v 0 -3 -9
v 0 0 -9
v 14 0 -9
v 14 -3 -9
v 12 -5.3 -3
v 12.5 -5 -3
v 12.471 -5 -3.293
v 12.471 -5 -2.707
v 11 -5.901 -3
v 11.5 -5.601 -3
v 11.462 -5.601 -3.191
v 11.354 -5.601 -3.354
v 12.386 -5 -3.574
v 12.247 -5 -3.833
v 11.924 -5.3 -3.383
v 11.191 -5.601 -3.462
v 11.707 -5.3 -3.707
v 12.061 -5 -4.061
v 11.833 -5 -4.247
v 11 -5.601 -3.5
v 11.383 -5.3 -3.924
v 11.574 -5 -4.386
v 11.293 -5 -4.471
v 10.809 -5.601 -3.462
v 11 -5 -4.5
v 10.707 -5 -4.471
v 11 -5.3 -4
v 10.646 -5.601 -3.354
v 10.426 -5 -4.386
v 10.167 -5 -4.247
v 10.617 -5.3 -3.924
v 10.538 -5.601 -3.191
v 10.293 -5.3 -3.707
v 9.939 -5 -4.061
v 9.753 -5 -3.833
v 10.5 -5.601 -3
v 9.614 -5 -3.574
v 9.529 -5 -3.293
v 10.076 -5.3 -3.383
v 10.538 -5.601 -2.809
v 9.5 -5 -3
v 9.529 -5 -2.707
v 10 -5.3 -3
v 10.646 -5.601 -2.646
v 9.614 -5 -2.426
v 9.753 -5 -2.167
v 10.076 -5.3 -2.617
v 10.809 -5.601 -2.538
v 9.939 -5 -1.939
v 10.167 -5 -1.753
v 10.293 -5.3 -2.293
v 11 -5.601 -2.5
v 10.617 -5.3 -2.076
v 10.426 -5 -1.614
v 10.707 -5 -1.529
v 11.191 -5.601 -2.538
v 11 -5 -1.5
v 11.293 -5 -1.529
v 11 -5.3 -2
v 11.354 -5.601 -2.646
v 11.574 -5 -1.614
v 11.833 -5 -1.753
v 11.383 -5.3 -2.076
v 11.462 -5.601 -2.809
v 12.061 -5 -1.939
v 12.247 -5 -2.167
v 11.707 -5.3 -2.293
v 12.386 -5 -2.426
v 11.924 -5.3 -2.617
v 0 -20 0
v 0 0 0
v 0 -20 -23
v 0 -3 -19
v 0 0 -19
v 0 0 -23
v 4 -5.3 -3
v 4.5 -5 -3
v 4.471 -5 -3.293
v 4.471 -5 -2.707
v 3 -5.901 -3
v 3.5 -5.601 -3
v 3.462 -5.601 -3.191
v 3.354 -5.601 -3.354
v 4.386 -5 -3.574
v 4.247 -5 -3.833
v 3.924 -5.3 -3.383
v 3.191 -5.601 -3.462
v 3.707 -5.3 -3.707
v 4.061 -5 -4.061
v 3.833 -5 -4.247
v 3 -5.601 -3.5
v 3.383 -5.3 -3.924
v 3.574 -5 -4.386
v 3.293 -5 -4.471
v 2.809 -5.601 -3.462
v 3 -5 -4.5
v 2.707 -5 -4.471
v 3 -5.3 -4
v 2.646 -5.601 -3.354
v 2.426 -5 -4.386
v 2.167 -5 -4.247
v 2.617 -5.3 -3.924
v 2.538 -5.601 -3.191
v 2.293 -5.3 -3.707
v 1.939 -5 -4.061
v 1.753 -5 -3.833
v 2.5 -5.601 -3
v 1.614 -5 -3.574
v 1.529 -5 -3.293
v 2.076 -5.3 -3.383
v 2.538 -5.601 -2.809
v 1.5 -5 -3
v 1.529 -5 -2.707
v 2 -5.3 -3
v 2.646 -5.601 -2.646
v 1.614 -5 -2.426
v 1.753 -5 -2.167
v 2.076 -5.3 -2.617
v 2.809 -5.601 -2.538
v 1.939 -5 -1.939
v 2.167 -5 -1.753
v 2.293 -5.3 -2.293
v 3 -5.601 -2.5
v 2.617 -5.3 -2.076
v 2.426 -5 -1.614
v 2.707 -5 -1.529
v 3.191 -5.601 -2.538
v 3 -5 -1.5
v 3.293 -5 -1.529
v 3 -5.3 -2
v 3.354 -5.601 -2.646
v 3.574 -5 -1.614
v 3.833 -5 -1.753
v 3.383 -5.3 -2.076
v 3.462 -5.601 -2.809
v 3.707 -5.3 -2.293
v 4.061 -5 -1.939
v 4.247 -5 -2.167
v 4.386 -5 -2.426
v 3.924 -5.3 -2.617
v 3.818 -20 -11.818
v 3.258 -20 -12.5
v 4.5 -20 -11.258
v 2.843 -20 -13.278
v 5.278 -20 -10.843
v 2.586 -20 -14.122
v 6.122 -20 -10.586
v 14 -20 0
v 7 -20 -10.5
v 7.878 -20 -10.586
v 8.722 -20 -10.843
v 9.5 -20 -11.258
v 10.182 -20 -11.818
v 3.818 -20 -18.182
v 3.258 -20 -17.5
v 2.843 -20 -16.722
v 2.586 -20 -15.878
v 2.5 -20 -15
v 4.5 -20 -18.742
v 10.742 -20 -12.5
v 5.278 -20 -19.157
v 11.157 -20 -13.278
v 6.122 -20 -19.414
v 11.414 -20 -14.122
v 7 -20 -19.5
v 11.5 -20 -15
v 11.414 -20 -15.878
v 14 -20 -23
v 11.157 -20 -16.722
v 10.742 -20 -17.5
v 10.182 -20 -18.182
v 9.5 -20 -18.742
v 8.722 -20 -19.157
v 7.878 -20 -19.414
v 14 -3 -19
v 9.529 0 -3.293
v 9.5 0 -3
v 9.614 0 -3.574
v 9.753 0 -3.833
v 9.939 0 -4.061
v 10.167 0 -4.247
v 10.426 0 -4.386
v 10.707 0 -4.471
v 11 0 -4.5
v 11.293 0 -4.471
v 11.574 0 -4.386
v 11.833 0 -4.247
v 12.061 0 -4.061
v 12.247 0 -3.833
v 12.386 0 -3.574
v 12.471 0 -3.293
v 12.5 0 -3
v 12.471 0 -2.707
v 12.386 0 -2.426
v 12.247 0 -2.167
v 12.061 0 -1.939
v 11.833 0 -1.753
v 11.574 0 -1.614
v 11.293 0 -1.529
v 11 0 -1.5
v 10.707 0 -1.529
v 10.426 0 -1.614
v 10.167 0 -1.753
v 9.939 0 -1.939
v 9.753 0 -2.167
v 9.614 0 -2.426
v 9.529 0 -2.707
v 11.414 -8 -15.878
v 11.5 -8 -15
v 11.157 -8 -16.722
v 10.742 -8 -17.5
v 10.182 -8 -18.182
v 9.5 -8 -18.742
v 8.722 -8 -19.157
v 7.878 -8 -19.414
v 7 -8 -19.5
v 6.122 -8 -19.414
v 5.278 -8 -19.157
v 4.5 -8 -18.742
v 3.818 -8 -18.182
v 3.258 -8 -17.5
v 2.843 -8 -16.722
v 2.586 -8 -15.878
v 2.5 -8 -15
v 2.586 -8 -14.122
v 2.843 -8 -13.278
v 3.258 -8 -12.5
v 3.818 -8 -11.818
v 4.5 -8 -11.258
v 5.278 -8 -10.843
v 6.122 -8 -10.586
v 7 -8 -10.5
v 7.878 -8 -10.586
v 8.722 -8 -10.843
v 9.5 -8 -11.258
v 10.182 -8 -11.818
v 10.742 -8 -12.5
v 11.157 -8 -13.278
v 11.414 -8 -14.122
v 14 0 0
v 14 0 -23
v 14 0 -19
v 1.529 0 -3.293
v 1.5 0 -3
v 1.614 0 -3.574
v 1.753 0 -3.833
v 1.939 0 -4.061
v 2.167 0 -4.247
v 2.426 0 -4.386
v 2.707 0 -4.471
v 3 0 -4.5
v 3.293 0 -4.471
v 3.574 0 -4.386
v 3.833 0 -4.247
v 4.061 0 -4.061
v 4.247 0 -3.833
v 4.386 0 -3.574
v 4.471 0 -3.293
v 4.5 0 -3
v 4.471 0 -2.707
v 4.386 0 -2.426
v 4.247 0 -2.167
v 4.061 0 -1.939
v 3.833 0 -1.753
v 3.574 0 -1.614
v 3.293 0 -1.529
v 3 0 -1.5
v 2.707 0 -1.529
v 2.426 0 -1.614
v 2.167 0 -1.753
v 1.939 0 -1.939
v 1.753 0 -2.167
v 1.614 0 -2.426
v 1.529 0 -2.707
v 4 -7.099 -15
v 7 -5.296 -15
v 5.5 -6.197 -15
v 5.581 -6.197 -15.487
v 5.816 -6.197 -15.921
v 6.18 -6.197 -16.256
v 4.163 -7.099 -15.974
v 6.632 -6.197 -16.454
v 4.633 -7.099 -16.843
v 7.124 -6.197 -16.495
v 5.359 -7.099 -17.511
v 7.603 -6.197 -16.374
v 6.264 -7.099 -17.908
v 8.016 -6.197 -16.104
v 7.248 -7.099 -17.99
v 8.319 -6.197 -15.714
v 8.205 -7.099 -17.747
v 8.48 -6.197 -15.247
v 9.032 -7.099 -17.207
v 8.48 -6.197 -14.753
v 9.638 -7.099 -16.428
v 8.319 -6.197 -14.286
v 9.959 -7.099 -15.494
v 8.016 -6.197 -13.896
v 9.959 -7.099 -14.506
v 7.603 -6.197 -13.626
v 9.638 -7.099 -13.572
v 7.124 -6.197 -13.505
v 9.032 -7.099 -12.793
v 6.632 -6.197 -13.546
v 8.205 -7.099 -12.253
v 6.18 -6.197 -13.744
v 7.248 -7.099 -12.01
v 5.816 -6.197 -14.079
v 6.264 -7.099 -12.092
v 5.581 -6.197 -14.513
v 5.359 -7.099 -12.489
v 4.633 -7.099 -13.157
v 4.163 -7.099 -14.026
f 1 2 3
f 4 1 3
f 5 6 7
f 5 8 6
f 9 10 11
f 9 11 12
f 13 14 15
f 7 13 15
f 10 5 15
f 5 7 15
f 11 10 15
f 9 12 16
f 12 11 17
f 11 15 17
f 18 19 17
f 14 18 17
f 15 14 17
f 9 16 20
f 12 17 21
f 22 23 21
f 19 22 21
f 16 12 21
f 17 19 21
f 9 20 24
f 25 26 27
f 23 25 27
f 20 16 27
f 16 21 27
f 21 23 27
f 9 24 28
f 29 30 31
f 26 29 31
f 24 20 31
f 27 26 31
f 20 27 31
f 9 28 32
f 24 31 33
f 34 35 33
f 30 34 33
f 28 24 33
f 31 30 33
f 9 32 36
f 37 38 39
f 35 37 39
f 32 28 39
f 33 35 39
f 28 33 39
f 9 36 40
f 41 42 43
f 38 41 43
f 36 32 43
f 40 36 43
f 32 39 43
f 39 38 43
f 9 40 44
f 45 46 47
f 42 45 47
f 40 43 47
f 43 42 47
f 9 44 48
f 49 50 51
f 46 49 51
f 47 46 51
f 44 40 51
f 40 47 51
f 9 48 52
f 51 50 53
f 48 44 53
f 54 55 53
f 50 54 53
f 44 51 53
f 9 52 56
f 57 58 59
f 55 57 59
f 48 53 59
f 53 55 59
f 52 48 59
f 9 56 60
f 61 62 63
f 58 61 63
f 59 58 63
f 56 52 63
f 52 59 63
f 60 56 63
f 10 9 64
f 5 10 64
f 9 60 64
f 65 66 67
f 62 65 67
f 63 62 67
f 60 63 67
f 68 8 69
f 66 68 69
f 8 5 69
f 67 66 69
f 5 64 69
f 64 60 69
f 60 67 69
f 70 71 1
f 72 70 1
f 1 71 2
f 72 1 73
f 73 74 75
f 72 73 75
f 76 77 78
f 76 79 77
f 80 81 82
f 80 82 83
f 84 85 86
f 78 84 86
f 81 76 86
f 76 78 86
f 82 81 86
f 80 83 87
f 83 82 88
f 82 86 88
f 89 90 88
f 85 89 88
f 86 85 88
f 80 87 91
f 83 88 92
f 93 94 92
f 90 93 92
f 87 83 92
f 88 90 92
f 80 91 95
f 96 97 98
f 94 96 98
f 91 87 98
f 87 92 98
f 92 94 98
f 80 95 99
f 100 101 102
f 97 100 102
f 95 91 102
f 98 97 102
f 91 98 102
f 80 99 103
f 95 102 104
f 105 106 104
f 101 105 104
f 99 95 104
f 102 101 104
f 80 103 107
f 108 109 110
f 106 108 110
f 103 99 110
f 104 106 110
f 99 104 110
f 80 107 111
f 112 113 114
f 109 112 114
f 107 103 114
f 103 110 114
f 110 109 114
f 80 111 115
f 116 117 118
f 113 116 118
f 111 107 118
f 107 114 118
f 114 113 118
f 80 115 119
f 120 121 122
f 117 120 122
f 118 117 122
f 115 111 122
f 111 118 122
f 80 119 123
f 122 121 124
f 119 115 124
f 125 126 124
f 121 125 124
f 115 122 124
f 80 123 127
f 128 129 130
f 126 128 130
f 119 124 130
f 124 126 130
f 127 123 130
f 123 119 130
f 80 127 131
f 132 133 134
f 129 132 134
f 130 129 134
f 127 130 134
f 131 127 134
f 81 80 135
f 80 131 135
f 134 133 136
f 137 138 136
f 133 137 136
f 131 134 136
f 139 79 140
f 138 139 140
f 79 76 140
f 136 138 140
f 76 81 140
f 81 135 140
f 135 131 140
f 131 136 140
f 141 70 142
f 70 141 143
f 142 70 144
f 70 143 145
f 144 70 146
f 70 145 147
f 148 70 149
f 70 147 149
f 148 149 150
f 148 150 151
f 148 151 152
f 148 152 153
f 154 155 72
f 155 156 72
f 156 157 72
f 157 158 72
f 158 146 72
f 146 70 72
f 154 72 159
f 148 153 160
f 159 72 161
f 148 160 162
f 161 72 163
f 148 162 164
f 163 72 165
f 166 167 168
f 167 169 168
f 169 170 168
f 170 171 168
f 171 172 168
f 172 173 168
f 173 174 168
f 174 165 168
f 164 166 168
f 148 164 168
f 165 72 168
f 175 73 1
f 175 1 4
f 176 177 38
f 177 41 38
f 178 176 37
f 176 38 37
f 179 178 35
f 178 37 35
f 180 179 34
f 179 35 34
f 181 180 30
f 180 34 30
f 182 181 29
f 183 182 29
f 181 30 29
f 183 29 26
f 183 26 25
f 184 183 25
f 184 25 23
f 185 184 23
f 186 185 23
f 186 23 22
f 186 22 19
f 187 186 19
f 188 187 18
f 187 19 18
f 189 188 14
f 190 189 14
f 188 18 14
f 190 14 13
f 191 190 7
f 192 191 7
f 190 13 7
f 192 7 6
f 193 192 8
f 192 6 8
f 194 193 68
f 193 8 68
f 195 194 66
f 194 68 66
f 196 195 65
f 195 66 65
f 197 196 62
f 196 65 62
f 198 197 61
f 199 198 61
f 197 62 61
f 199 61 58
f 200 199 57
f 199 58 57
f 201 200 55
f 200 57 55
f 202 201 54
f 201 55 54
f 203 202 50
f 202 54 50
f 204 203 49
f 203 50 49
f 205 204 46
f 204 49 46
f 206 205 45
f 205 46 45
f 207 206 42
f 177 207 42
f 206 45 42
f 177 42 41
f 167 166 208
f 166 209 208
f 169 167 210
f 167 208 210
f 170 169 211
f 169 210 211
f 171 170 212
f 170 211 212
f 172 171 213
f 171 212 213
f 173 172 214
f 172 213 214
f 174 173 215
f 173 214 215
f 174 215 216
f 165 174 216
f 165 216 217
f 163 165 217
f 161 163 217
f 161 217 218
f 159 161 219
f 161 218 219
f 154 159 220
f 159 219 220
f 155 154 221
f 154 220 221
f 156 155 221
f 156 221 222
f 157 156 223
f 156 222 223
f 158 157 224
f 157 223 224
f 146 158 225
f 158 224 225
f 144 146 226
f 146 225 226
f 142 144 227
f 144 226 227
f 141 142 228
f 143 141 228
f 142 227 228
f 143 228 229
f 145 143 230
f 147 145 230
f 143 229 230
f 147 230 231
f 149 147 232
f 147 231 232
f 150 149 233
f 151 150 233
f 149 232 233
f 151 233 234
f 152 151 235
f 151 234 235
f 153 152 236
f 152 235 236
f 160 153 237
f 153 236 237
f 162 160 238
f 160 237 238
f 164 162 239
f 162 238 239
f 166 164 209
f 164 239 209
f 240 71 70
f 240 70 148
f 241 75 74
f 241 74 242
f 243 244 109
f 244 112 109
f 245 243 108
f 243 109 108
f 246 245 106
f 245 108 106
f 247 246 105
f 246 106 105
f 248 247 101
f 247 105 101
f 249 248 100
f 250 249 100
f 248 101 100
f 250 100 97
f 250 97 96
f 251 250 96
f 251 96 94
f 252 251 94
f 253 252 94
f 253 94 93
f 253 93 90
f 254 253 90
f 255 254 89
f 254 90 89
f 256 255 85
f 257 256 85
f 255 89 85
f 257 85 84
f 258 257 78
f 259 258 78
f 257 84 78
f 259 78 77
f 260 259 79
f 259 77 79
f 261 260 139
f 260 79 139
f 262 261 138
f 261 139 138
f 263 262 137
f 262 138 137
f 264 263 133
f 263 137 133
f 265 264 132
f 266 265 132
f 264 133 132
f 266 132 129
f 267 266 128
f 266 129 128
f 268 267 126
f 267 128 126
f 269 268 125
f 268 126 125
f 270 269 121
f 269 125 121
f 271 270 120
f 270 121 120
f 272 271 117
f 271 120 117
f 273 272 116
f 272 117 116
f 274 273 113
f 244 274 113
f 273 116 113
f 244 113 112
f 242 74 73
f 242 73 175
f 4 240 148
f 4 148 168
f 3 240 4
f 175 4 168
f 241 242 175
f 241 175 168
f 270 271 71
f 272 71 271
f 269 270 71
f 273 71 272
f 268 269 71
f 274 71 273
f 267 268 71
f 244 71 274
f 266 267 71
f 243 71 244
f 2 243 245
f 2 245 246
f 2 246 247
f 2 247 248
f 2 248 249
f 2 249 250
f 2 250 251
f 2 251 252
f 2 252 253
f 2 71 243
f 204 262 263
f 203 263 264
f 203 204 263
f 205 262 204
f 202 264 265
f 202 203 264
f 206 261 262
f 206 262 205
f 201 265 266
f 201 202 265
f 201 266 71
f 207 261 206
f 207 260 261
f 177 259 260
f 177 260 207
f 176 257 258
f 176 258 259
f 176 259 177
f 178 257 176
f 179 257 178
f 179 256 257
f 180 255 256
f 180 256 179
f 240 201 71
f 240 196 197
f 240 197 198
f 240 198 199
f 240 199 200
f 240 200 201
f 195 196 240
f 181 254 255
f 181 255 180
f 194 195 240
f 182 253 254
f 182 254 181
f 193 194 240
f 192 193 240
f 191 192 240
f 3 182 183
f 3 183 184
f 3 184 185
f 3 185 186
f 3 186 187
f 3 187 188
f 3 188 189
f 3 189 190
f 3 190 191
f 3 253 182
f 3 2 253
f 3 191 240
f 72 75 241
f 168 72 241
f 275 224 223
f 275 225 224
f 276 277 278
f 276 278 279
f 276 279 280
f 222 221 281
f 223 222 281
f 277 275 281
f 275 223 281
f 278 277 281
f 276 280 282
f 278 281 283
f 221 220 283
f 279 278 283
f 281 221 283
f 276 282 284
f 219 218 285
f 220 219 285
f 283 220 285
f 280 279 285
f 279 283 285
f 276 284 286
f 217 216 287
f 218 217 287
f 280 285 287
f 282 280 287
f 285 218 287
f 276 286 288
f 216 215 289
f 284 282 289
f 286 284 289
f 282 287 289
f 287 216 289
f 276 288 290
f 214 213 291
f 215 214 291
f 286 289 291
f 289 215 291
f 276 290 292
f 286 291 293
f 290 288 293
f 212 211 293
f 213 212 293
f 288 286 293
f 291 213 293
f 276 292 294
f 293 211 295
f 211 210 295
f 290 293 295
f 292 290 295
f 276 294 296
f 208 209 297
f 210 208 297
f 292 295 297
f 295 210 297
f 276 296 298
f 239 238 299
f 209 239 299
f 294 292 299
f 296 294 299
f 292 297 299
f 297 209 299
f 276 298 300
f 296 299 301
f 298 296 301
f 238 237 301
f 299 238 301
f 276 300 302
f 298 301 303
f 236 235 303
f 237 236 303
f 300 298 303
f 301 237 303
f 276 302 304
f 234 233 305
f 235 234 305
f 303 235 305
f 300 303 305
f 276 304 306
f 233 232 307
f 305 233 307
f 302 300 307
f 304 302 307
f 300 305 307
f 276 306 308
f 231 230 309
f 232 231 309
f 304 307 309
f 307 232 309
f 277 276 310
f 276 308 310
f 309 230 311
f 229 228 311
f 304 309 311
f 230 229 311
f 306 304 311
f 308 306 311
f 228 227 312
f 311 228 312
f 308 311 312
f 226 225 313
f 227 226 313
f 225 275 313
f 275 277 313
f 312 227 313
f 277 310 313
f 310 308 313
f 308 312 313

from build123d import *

# Parameters (mm, degrees)
SKETCH1_W                    = 14
SKETCH1_H                    = 23
BOSS_EXTRUDE1_DEPTH          = 20
SKETCH2_W                    = 14
SKETCH2_H                    = 10
CUT_EXTRUDE1_DEPTH           = 3
F_3_0_3_DIAMETER_HOLE1_D     = 3
F_3_0_3_DIAMETER_HOLE1_DEPTH = 5
F_3_0_3_DIAMETER_HOLE1_TIP   = 0.901290929
M10X1_0_TAPPED_HOLE1_D       = 9
M10X1_0_TAPPED_HOLE1_DEPTH   = 12
M10X1_0_TAPPED_HOLE1_TIP     = 2.703872786


with BuildPart() as part:
    # Sketch1 → Boss-Extrude1 (new body)
    with BuildSketch(Plane(origin=(0, 0, 0), x_dir=(1, 0, 0), z_dir=(0, 1, 0))):
        with Locations((7, 11.5)):
            Rectangle(SKETCH1_W, SKETCH1_H)
    extrude(amount=-BOSS_EXTRUDE1_DEPTH)

    # Sketch2 → Cut-Extrude1 (cut)
    with BuildSketch(Plane(origin=(0, 0, 0), x_dir=(1, 0, 0), z_dir=(0, 1, 0))):
        with Locations((7, 14)):
            Rectangle(SKETCH2_W, SKETCH2_H)
    extrude(amount=-CUT_EXTRUDE1_DEPTH, mode=Mode.SUBTRACT)

    # Ø3.0 (3) Diameter Hole1
    with Locations(Plane(origin=(0, 0, 0), x_dir=(1, 0, 0), z_dir=(0, 1, 0))):
        with Locations((11, 3), (3, 3)):
            Hole(F_3_0_3_DIAMETER_HOLE1_D / 2, depth=F_3_0_3_DIAMETER_HOLE1_DEPTH)
            with Locations((0, 0, -(F_3_0_3_DIAMETER_HOLE1_DEPTH + F_3_0_3_DIAMETER_HOLE1_TIP / 2))):  # 118° drill point
                Cone(0, F_3_0_3_DIAMETER_HOLE1_D / 2, F_3_0_3_DIAMETER_HOLE1_TIP, mode=Mode.SUBTRACT)

    # M10x1.0 Tapped Hole1
    with Locations(Plane(origin=(0, -20, 0), x_dir=(-1, 0, 0), z_dir=(0, -1, 0))):
        with Locations((-7, 15)):
            Hole(M10X1_0_TAPPED_HOLE1_D / 2, depth=M10X1_0_TAPPED_HOLE1_DEPTH)
            with Locations((0, 0, -(M10X1_0_TAPPED_HOLE1_DEPTH + M10X1_0_TAPPED_HOLE1_TIP / 2))):  # 118° drill point
                Cone(0, M10X1_0_TAPPED_HOLE1_D / 2, M10X1_0_TAPPED_HOLE1_TIP, mode=Mode.SUBTRACT)


solid = part.part
